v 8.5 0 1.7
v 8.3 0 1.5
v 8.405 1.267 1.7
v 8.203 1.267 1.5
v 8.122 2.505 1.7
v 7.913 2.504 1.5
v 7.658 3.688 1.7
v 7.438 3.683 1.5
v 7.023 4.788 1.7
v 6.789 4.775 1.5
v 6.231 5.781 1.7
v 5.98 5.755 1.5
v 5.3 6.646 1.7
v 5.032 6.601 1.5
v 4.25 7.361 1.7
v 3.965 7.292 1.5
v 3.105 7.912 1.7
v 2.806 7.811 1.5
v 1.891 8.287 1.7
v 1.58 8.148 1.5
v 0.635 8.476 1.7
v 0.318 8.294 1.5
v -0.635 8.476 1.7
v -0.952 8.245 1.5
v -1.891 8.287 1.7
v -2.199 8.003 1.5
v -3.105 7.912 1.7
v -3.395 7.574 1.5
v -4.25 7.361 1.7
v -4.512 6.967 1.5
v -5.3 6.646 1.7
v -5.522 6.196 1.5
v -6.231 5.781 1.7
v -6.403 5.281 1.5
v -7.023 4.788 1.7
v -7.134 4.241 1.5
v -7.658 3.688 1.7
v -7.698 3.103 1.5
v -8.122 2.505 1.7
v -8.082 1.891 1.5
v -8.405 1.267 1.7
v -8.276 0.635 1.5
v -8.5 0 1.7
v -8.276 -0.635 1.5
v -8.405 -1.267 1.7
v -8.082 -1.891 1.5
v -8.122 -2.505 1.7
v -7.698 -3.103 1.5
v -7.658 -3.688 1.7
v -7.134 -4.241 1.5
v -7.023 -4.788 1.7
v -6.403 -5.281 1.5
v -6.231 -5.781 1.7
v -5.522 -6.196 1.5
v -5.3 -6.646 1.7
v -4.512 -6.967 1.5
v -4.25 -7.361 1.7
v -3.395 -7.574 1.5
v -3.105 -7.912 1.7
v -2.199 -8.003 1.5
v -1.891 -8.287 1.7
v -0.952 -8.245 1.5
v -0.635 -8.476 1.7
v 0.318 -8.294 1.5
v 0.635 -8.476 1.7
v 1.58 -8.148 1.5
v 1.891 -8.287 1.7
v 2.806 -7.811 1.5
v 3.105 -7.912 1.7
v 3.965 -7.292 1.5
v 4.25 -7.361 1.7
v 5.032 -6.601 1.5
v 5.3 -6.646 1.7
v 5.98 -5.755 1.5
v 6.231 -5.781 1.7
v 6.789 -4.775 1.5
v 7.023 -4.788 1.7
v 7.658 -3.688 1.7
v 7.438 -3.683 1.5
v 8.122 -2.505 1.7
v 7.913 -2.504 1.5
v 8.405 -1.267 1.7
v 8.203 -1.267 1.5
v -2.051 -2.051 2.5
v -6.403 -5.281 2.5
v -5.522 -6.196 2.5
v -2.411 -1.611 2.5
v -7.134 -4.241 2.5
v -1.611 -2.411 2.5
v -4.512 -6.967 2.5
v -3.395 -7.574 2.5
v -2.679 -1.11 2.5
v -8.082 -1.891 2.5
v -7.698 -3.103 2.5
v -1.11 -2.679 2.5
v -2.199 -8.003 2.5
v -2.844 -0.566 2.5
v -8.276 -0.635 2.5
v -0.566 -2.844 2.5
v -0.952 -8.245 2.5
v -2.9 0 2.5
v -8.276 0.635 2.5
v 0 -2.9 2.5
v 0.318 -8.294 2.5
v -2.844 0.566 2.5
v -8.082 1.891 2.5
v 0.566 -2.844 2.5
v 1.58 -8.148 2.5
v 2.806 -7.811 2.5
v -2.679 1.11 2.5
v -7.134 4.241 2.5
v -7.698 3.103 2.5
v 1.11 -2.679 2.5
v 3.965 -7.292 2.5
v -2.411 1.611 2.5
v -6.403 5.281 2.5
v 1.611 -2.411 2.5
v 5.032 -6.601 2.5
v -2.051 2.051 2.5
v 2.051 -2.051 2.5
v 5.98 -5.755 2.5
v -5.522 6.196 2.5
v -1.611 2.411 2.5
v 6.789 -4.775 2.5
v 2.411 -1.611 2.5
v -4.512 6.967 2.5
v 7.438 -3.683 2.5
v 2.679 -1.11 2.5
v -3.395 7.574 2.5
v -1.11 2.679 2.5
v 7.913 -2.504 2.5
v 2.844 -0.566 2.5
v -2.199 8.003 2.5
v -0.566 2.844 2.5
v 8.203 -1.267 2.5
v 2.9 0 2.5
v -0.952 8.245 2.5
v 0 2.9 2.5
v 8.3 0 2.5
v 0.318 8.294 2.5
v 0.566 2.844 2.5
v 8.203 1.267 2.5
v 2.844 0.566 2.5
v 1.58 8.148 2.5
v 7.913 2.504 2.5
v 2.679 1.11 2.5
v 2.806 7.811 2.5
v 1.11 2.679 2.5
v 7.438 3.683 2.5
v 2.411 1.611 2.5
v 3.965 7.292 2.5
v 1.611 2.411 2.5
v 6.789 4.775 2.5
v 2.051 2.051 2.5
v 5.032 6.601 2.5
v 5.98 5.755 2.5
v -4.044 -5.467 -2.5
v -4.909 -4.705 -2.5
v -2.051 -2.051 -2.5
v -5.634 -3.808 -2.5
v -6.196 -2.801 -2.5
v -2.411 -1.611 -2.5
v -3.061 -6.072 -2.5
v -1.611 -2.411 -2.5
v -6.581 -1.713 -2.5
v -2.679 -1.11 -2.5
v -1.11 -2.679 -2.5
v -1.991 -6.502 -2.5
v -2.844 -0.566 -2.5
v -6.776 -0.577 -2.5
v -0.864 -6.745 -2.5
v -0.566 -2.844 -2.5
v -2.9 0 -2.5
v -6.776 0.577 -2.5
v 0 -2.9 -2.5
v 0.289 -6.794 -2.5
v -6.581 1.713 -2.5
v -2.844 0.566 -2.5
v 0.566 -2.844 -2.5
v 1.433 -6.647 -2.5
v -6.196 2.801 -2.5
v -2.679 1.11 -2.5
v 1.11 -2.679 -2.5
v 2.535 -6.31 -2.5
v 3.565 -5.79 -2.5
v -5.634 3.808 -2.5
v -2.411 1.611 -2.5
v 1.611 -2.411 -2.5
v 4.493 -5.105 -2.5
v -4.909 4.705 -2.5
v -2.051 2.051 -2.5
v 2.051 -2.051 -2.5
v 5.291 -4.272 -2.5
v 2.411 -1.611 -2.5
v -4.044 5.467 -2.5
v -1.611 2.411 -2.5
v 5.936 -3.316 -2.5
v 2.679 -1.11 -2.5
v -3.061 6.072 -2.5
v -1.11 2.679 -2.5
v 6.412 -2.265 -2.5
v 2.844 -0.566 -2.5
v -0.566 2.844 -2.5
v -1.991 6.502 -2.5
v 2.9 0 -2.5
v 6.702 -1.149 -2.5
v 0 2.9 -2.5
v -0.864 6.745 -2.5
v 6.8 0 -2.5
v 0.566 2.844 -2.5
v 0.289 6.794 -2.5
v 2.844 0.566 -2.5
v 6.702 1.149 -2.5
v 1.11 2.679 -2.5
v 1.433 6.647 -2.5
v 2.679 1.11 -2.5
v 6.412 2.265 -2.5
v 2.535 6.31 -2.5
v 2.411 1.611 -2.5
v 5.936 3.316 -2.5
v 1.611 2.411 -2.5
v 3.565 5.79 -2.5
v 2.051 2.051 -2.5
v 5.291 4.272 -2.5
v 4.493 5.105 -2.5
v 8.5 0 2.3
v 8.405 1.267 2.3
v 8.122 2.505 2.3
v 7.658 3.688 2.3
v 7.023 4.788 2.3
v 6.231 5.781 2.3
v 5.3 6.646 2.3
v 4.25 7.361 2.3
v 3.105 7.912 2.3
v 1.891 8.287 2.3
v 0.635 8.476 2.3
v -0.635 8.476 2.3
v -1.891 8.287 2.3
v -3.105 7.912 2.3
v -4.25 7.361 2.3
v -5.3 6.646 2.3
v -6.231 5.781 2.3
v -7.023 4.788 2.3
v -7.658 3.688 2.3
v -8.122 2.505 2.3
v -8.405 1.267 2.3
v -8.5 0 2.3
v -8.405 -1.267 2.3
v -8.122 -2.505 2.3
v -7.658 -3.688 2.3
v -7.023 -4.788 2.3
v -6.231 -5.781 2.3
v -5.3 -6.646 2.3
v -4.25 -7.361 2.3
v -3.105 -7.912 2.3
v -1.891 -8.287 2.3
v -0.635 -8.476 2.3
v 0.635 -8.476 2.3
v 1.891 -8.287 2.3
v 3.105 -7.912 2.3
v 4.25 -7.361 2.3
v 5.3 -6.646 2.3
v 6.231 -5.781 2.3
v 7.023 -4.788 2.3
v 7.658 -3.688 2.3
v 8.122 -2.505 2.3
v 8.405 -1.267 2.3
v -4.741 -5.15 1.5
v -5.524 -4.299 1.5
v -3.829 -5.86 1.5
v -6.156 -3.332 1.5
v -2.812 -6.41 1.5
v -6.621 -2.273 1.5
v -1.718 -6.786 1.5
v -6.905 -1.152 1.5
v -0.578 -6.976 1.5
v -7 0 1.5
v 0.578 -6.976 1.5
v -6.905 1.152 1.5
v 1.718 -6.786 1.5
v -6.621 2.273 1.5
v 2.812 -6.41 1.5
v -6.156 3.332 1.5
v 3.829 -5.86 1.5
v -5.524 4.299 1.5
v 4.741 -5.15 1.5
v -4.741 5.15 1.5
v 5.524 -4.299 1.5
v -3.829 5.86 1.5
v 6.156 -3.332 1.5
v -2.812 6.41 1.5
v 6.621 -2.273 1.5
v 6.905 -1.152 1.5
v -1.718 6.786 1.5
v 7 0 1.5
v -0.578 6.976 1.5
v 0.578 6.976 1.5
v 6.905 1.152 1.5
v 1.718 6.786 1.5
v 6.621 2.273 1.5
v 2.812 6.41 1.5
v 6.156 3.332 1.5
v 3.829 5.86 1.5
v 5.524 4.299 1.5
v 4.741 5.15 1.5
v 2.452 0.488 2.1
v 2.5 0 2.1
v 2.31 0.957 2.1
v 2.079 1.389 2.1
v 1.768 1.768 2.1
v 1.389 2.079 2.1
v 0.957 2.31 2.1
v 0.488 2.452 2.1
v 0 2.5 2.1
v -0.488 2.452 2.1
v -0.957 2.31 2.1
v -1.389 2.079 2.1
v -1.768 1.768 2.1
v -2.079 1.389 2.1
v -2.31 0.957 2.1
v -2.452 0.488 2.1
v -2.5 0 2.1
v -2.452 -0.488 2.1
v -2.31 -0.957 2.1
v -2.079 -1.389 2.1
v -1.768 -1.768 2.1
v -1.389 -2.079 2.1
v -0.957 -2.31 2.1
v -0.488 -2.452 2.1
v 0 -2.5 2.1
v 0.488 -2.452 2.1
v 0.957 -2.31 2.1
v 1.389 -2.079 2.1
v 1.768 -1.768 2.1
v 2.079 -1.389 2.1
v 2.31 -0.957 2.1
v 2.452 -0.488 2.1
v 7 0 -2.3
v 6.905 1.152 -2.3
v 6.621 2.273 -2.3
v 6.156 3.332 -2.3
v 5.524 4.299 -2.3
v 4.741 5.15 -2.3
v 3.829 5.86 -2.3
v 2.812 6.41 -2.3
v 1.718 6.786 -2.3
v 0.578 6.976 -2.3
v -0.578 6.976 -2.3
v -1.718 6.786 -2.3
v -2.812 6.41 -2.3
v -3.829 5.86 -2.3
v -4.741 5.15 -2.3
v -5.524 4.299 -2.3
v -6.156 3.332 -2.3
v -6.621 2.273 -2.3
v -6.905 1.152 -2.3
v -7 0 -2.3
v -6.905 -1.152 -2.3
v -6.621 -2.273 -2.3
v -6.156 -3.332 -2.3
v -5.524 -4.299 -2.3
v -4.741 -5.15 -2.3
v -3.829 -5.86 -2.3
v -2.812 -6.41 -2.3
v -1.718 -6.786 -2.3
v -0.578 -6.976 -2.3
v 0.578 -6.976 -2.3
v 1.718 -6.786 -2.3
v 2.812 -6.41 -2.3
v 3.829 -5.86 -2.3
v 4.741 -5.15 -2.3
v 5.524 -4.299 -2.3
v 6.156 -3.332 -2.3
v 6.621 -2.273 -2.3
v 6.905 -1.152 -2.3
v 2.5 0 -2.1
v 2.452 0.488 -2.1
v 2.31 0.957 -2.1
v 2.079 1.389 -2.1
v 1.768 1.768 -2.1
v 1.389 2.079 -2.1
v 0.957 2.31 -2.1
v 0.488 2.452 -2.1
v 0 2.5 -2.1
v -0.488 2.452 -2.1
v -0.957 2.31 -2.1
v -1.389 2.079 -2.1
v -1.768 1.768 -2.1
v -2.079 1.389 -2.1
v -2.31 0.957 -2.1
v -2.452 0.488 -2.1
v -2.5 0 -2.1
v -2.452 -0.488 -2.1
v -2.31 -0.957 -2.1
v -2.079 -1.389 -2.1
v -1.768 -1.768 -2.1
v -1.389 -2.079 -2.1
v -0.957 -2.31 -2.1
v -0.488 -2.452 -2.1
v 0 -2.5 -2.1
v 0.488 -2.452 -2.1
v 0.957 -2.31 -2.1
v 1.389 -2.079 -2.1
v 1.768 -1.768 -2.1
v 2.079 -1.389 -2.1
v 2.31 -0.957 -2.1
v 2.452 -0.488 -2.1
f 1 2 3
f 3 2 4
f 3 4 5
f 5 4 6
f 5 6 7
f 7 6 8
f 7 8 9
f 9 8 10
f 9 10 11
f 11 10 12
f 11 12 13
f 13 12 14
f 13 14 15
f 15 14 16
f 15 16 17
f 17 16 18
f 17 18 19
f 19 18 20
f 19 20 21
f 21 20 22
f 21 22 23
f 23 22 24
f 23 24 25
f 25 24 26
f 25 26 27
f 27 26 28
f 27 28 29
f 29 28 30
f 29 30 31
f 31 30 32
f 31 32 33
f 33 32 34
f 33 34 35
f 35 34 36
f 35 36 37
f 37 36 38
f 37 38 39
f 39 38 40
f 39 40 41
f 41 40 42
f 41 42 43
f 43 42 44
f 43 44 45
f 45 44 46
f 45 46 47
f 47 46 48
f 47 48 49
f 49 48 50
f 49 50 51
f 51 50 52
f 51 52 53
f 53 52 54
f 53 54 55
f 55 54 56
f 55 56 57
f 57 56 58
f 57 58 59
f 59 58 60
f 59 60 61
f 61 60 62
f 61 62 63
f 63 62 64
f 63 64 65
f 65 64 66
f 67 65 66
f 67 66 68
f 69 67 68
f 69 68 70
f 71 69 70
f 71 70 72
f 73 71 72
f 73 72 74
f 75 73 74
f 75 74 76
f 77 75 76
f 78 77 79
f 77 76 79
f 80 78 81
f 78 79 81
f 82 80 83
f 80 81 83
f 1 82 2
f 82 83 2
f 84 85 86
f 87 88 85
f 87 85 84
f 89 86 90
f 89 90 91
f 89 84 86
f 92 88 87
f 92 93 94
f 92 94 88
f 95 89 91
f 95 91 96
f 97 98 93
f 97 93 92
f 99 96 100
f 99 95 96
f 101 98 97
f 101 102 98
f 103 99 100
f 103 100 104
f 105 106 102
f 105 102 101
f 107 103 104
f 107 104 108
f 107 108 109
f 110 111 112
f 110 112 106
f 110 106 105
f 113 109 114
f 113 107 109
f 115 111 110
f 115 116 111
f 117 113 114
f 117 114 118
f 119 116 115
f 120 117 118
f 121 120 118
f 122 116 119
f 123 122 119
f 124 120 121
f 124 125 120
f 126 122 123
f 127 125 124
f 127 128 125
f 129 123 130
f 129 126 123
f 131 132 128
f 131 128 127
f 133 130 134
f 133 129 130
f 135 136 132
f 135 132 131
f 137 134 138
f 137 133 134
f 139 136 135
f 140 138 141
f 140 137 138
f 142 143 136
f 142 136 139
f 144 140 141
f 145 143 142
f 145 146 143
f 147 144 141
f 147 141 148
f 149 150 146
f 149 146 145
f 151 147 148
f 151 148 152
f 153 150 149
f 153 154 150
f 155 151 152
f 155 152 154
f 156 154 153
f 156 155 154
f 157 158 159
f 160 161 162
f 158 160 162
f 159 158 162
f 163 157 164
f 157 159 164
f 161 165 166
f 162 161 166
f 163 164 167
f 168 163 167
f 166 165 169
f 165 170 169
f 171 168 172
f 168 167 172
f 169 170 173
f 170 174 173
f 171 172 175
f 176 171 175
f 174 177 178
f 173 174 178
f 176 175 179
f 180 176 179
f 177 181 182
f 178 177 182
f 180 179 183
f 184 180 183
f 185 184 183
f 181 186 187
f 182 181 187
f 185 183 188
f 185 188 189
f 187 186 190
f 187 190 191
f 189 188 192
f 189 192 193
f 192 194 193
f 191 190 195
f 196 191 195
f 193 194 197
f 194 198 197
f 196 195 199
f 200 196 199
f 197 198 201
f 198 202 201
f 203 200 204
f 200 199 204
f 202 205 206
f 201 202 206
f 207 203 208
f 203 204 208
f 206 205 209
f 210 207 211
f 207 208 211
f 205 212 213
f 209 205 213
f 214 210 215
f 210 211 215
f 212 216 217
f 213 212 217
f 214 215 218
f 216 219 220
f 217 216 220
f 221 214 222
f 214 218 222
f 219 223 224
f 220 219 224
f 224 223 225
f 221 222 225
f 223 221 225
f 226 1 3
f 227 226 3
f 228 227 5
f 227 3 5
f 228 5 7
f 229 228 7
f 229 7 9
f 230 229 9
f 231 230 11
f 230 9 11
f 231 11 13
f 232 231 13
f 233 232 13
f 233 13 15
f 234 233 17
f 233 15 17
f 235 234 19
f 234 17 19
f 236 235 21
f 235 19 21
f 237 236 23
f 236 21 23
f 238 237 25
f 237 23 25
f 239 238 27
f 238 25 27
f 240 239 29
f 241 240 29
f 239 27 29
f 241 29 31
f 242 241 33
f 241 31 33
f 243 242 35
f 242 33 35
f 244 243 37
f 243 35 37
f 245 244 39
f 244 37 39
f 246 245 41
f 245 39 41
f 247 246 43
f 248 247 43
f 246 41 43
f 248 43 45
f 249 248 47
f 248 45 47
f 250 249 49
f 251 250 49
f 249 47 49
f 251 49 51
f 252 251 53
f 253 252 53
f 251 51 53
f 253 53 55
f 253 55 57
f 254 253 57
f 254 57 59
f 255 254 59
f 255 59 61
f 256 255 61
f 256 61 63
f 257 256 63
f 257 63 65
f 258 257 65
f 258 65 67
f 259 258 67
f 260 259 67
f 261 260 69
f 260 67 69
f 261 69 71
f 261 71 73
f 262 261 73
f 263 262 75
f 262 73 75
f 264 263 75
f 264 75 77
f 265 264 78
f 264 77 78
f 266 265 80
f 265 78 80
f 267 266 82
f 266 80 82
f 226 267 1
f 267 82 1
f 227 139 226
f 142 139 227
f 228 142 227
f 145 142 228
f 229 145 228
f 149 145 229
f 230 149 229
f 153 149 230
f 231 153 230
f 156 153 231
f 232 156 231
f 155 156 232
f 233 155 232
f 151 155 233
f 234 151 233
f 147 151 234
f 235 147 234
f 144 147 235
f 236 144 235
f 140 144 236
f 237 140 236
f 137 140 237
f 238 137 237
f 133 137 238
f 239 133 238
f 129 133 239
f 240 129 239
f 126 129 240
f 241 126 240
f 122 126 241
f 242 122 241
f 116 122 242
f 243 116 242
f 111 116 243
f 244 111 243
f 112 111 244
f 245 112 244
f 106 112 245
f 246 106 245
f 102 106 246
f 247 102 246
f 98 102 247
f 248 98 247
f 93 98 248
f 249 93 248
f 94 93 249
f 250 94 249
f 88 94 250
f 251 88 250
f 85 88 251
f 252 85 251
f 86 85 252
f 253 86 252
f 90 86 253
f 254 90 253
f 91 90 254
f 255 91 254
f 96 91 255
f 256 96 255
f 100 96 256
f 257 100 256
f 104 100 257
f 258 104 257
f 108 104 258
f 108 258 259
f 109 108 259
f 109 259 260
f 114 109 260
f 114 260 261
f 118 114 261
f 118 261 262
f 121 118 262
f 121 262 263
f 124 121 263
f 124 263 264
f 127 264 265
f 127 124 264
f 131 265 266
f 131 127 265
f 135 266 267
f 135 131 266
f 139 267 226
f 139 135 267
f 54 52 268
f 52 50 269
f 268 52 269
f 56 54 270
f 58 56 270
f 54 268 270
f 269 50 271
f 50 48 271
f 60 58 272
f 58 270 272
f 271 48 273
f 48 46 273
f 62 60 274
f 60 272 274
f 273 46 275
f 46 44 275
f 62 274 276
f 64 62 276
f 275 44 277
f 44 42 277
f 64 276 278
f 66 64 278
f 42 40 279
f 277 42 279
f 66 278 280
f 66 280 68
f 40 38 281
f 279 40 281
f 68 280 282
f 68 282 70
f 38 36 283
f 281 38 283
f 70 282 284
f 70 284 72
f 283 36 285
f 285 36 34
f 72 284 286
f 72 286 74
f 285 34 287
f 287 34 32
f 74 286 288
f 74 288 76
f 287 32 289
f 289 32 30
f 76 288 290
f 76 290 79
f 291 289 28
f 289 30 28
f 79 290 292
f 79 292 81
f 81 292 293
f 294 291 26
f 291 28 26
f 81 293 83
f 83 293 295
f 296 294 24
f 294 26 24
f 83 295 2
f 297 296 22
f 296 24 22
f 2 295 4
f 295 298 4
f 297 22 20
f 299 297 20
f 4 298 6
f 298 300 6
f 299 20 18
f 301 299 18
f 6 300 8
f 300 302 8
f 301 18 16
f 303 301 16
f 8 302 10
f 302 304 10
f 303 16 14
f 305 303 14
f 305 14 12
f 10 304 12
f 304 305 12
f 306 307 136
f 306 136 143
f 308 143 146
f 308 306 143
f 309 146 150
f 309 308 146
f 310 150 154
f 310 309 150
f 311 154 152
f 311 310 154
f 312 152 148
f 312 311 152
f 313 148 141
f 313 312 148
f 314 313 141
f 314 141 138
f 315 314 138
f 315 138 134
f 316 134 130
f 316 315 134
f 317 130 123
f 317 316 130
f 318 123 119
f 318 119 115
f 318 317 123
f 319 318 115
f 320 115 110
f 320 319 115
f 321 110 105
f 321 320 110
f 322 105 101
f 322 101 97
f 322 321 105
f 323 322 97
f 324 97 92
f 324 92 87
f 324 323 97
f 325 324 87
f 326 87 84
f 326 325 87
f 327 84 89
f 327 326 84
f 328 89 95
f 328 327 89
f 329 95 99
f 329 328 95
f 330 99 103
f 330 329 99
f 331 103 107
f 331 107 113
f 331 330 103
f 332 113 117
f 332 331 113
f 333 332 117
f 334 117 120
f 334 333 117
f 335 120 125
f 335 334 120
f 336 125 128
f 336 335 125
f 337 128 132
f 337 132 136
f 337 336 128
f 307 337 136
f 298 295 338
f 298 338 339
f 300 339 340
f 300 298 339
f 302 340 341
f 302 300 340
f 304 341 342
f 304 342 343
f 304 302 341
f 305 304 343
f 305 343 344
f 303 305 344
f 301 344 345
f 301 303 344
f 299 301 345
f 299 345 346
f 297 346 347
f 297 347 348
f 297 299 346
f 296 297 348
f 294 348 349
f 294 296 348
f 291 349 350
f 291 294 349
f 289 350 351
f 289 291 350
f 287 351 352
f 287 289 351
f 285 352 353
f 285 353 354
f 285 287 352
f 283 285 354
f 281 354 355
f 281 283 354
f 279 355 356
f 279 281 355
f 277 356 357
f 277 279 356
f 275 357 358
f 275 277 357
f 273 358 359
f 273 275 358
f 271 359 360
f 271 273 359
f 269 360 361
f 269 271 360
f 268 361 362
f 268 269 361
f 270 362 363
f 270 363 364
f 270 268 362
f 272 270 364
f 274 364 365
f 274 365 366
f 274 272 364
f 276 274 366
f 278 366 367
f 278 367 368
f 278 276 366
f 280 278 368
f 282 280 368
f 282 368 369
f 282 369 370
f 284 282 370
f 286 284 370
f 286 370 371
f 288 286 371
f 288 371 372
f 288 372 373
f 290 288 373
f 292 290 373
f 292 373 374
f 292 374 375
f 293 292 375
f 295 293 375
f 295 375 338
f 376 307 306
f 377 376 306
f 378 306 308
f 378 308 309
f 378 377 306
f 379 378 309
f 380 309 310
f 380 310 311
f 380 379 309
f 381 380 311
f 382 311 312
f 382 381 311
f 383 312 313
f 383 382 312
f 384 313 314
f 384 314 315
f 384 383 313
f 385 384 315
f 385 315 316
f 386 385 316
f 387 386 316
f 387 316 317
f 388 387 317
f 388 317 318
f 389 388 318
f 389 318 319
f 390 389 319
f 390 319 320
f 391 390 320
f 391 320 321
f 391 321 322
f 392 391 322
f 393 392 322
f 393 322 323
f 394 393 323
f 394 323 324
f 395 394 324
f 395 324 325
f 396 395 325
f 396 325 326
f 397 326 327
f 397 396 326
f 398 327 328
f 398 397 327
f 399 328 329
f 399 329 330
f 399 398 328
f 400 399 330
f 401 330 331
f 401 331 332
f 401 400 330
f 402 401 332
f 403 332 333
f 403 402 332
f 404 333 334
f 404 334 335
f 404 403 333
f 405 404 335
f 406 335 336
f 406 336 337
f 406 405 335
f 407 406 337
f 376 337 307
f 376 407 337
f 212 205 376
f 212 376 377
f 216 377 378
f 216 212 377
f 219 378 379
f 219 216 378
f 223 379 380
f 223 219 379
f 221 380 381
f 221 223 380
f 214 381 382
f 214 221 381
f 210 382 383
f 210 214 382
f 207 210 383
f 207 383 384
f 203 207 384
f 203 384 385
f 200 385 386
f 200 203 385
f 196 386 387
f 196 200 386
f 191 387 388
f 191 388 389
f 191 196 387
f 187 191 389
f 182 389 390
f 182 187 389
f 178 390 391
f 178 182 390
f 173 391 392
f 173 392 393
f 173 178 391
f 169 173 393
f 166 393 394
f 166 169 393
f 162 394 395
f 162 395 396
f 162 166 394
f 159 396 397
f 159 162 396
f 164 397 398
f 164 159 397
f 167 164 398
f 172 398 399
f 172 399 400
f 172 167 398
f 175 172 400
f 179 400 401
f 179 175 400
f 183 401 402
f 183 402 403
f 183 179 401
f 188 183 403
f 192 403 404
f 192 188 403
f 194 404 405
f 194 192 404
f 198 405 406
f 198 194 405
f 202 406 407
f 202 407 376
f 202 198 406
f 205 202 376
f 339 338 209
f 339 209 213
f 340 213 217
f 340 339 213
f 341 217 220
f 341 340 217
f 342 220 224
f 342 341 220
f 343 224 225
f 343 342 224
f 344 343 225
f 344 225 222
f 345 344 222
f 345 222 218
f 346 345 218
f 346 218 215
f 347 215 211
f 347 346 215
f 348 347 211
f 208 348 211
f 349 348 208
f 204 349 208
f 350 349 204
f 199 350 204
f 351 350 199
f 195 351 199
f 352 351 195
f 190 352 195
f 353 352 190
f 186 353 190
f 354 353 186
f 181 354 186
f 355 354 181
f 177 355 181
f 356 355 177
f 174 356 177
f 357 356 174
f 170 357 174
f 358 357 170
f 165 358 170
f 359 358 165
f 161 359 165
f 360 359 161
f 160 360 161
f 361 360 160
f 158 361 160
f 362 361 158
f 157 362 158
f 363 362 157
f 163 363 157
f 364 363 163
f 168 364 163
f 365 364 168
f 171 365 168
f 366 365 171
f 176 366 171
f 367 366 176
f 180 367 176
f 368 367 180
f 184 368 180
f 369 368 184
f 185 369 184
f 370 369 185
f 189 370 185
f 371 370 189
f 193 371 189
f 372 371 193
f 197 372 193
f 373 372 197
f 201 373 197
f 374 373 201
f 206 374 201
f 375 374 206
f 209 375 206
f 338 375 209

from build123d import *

# Parameters (mm, degrees)
SKETCH_1_R      = 7
SKETCH_1_R_2    = 2.5
EXTRUDE_1_DEPTH = 2.5
EXTRUDE_START   = -1
SKETCH_2_R      = 8.5
SKETCH_2_R_2    = 2.5
EXTRUDE_2_DEPTH = 1
CHAMFER_1_SIZE  = 0.2
CHAMFER_2_SIZE  = 0.4


with BuildPart() as part:
    # 草图1 → 凸台-拉伸1 (new, symmetric)
    with BuildSketch(Plane.XY):
        Circle(SKETCH_1_R)
        Circle(SKETCH_1_R_2, mode=Mode.SUBTRACT)
    extrude(amount=EXTRUDE_1_DEPTH, both=True)

    # 草图2 → 凸台-拉伸2 (add)
    with BuildSketch(Plane.XY.offset(2.5).offset(EXTRUDE_START)):
        Circle(SKETCH_2_R)
        Circle(SKETCH_2_R_2, mode=Mode.SUBTRACT)
    extrude(amount=EXTRUDE_2_DEPTH)

    # 倒角1
    chamfer_1_edges = [part.edges().sort_by_distance(p)[0] for p in [
        (-8.5, 0, 2.5),
        (-8.5, 0, 1.5),
        (-7, 0, -2.5),
    ]]
    chamfer(chamfer_1_edges, length=CHAMFER_1_SIZE)

    # 倒角2
    chamfer_2_edges = [part.edges().sort_by_distance(p)[0] for p in [
        (-2.5, 0, -2.5),
        (-2.5, 0, 2.5),
    ]]
    chamfer(chamfer_2_edges, length=CHAMFER_2_SIZE)


solid = part.part
